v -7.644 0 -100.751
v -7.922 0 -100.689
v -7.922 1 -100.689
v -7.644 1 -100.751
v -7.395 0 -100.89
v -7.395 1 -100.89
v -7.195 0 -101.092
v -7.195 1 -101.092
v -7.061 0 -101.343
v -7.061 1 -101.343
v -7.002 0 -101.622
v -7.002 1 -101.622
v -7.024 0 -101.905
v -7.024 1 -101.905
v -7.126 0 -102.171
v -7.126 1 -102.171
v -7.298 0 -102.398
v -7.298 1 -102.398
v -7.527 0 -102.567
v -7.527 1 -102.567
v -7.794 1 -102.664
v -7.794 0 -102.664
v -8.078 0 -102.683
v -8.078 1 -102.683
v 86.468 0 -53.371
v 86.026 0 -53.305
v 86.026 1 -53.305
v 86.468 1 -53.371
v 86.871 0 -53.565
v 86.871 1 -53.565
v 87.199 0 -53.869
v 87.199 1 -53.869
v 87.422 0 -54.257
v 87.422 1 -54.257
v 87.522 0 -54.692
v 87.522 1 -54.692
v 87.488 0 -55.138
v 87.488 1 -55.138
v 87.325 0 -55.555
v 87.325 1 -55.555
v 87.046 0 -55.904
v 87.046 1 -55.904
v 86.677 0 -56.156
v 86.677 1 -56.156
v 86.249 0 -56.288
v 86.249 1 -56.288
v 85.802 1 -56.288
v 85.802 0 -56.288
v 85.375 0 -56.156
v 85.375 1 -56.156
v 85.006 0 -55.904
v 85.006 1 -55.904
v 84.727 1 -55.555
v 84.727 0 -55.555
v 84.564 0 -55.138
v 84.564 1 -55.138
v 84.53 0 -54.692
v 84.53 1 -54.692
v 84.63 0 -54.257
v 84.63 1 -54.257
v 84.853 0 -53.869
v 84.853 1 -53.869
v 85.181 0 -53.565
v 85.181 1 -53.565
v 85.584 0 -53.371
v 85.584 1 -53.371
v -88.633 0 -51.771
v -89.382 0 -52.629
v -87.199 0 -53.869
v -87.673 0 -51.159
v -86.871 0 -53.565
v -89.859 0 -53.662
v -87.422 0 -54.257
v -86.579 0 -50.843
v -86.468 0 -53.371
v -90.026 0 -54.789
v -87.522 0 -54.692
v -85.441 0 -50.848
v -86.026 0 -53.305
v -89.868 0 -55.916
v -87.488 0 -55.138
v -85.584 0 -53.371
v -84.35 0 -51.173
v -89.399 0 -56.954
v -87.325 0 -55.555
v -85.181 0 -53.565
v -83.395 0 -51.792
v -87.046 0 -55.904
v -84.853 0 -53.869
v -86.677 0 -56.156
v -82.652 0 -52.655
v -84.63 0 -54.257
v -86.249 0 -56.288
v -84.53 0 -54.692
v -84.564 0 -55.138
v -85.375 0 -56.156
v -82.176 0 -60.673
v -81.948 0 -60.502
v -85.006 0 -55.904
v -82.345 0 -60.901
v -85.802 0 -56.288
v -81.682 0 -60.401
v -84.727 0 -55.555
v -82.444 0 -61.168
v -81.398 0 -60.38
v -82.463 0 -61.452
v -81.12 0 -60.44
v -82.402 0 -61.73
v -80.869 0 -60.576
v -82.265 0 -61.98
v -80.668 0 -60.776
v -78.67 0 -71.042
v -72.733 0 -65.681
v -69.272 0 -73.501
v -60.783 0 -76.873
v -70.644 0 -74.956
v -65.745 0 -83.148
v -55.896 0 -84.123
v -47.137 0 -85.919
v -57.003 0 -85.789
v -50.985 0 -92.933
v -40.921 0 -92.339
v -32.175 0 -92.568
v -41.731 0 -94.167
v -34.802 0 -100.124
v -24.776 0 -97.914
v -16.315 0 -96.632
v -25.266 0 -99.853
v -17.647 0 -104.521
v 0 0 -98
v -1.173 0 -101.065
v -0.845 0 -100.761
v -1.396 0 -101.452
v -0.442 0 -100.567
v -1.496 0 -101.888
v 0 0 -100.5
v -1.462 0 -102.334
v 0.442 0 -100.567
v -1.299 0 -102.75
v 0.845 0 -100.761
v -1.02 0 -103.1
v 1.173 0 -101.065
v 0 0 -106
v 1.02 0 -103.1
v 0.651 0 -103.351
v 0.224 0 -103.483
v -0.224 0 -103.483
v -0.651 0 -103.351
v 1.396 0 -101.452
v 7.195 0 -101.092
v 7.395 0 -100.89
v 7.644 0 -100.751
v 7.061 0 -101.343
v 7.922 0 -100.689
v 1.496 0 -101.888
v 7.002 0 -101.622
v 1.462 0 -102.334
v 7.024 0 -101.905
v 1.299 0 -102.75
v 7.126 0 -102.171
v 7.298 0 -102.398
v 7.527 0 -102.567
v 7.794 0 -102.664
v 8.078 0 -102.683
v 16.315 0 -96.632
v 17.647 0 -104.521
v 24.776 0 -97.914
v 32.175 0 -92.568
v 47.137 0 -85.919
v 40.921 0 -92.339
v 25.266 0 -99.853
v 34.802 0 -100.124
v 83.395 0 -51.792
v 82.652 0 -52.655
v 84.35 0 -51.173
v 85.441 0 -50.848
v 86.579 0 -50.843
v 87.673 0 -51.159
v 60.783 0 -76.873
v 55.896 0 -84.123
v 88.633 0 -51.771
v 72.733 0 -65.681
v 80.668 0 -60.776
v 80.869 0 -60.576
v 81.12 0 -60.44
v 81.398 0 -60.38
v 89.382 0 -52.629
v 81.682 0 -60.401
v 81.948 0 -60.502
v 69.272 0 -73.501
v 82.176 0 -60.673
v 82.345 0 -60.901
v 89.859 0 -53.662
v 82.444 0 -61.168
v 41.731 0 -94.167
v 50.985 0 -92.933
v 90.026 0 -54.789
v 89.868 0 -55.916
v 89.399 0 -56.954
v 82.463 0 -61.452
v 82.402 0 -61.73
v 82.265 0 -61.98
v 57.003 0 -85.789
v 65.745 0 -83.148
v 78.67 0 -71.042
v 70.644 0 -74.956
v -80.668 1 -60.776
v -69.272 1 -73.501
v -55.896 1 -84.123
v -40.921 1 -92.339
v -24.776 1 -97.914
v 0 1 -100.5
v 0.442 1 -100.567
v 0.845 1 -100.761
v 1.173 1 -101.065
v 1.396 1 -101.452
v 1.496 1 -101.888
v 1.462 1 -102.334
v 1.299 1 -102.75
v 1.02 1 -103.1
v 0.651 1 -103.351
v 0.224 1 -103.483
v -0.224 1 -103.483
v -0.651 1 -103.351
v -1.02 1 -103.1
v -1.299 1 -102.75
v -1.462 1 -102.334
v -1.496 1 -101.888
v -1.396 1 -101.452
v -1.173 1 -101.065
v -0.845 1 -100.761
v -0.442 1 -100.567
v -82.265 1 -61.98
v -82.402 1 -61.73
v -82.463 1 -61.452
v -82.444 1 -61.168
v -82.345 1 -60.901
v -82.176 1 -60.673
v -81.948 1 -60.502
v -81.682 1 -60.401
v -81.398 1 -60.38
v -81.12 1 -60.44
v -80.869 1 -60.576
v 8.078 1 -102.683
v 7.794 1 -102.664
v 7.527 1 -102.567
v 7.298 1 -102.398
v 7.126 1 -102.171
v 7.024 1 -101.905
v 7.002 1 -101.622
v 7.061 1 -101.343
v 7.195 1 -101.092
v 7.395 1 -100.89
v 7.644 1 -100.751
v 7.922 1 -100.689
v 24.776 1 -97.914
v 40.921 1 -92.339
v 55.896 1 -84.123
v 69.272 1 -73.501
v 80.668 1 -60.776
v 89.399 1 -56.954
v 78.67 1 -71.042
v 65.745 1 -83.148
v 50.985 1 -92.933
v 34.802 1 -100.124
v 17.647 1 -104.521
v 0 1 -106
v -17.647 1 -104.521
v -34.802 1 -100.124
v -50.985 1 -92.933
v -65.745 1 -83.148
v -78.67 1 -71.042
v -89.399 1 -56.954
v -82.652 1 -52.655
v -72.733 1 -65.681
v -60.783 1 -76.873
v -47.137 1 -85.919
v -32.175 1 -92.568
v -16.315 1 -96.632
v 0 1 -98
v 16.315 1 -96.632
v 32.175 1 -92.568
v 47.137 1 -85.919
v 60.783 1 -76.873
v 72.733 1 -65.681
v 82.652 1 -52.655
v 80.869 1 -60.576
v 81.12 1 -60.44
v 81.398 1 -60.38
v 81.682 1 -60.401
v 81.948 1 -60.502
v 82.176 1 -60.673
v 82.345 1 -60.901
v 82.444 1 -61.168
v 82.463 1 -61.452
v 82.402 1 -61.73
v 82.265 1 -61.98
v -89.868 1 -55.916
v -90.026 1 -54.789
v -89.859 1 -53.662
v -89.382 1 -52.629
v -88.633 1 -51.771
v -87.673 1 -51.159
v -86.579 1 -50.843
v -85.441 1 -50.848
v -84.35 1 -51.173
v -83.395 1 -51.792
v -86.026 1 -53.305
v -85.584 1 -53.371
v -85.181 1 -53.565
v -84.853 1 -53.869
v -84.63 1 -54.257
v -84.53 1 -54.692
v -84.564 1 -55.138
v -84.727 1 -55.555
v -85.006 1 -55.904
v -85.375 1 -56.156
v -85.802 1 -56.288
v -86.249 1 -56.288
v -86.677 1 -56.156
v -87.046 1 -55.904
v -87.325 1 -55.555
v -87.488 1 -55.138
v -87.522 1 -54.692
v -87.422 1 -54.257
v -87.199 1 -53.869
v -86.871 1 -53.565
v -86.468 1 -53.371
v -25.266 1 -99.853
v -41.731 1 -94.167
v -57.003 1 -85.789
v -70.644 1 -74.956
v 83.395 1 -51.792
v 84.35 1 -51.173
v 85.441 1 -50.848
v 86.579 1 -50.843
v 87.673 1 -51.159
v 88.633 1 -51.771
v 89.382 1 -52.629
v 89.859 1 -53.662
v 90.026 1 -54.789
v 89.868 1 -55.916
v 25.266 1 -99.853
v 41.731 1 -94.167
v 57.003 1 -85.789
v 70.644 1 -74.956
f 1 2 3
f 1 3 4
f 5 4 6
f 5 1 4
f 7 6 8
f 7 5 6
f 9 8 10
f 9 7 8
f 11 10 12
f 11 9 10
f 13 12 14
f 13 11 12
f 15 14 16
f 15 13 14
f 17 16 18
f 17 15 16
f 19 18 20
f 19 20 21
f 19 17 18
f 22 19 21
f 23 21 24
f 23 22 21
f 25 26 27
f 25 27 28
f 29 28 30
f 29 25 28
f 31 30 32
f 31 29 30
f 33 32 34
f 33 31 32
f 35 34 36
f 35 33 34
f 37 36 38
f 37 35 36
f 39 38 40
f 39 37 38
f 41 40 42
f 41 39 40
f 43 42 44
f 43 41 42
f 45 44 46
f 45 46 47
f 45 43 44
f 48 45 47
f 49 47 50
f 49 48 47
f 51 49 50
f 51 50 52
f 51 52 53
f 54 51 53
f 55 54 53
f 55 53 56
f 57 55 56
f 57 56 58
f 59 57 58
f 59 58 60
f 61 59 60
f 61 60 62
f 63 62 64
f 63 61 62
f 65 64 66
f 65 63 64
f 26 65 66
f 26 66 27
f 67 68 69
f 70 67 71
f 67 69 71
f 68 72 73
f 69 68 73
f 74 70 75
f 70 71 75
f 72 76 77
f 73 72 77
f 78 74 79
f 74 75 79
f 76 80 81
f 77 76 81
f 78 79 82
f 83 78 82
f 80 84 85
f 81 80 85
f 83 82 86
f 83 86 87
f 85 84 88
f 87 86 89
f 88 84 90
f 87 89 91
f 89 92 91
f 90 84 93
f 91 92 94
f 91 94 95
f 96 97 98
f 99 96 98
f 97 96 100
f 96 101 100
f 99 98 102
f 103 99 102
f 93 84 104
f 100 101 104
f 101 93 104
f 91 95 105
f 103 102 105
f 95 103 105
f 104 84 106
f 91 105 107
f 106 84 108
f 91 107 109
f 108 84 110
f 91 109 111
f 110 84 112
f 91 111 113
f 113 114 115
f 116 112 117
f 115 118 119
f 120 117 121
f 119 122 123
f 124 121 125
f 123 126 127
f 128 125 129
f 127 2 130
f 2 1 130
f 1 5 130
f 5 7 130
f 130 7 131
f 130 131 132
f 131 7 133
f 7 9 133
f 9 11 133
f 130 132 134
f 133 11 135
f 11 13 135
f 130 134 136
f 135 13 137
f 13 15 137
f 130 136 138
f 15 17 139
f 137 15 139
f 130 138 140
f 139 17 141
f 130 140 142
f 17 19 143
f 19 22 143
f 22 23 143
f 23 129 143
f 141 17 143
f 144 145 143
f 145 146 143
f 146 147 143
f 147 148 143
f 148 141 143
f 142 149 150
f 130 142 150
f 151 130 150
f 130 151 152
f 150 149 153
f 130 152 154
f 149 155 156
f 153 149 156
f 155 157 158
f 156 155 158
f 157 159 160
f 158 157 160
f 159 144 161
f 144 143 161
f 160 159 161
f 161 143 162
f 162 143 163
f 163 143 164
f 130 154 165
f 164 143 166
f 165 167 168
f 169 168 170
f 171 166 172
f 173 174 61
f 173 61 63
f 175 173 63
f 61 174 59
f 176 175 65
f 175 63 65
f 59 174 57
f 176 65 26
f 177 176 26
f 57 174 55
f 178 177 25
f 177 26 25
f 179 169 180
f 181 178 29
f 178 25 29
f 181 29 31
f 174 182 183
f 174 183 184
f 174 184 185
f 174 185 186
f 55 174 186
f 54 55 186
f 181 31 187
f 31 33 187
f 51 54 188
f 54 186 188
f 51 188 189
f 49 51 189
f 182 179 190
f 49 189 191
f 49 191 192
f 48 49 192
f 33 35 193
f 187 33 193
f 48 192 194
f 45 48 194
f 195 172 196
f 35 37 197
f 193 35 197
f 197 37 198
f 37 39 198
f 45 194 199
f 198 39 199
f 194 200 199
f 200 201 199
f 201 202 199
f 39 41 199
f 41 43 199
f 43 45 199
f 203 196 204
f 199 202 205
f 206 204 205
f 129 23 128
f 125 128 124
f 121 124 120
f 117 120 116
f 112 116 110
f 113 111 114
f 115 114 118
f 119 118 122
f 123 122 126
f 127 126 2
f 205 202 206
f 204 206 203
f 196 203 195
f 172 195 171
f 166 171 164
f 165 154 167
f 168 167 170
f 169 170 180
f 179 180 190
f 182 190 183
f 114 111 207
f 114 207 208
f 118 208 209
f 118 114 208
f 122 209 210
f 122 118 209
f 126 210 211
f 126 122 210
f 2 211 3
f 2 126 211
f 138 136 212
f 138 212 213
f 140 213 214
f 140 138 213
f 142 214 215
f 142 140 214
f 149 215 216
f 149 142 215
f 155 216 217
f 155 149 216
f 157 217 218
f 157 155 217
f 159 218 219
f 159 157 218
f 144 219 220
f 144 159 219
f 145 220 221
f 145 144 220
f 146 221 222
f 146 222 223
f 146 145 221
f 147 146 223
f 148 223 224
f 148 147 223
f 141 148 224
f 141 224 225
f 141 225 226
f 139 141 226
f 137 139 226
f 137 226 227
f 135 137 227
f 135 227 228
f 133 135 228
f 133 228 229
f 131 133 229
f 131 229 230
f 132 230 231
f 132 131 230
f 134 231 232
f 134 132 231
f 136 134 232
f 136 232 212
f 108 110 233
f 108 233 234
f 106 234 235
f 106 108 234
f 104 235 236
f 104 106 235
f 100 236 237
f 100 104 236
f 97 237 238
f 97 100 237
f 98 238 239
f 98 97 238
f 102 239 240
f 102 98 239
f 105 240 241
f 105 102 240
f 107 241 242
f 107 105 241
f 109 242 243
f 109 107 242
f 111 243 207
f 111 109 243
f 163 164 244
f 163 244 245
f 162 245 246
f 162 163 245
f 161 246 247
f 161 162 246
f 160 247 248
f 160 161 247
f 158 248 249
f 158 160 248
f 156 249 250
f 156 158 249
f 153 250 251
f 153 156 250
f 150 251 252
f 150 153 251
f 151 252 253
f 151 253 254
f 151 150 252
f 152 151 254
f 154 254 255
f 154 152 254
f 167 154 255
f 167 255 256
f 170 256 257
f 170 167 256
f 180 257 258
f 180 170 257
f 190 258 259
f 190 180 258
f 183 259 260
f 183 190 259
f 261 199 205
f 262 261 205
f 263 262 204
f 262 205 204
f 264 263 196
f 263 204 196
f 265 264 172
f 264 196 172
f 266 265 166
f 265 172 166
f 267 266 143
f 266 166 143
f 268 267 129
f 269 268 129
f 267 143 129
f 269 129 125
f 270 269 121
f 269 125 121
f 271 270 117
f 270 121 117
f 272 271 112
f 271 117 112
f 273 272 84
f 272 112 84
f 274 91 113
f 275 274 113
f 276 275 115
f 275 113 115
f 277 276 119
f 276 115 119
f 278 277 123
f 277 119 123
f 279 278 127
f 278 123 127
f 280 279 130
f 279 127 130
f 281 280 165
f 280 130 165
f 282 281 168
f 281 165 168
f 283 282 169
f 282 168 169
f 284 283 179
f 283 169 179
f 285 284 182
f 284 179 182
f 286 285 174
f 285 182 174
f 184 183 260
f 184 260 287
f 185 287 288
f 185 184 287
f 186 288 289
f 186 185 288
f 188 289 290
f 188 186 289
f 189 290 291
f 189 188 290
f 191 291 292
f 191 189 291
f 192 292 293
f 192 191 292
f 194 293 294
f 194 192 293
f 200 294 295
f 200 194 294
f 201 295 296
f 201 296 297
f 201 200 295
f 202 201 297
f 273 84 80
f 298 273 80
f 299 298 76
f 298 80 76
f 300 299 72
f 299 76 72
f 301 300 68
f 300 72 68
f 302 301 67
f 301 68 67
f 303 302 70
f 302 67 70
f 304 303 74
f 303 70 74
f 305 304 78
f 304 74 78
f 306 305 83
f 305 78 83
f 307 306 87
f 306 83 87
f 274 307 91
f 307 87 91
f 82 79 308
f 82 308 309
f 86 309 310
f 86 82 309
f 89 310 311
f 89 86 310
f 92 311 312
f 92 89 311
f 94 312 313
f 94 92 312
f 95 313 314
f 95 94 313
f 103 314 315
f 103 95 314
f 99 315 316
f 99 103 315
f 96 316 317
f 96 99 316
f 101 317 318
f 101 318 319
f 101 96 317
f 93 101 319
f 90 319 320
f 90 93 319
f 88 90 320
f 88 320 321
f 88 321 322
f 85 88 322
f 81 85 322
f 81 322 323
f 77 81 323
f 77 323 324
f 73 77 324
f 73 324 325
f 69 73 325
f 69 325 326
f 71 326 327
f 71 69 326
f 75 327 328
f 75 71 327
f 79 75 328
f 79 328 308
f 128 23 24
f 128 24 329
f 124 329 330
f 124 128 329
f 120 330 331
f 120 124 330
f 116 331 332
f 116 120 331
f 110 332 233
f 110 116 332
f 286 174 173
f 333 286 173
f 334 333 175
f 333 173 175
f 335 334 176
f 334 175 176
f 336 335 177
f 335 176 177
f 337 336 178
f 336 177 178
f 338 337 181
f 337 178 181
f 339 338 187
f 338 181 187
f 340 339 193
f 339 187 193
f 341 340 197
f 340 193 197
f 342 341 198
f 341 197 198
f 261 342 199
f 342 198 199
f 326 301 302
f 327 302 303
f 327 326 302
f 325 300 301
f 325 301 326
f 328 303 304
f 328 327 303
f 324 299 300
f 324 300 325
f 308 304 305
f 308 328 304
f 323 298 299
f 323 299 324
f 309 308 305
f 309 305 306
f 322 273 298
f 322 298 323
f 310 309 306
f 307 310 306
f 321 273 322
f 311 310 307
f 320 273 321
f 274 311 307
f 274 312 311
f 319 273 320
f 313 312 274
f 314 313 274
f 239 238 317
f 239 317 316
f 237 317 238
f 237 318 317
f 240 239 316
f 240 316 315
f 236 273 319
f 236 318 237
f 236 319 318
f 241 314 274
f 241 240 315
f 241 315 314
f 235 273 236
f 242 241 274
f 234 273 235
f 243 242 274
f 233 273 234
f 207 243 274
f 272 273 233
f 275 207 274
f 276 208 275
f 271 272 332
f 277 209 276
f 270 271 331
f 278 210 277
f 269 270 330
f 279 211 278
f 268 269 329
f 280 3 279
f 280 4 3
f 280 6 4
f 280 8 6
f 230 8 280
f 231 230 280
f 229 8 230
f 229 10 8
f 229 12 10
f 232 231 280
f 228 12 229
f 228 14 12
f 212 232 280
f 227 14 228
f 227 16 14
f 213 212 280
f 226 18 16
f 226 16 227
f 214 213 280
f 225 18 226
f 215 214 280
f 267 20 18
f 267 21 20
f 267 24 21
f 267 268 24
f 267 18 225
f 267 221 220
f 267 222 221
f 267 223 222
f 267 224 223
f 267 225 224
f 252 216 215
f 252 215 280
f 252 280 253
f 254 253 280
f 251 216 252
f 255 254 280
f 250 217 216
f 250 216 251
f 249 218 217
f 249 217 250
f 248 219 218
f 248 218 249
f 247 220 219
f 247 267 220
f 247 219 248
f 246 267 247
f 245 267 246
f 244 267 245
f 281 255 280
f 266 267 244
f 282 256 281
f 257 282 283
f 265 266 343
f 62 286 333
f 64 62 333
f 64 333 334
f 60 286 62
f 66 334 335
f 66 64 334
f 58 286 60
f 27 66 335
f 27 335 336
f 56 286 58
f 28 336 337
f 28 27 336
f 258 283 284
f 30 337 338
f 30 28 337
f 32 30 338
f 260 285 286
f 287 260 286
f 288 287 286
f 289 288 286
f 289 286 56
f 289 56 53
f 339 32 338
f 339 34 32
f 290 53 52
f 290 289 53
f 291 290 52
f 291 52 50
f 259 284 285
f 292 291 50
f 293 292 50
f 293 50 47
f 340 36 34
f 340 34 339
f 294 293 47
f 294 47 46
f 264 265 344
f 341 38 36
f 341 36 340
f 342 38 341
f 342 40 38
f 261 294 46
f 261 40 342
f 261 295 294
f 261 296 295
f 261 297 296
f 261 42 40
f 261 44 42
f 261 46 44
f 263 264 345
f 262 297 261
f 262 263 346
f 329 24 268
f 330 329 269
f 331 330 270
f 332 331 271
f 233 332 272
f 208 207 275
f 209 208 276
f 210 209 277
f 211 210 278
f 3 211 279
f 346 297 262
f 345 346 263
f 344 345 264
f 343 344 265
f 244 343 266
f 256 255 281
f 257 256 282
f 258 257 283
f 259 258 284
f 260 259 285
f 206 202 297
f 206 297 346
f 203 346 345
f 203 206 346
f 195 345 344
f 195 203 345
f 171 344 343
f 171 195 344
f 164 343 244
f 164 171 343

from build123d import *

# Parameters (mm, degrees)
SKETCH_1_R      = 1.5
EXTRUDE_1_DEPTH = 1


with BuildPart() as part:
    # 草图1 → 凸台-拉伸1 (new body)
    with BuildSketch(Plane(origin=(0, 0, 0), x_dir=(1, 0, 0), z_dir=(0, 1, 0))):
        with BuildLine():
            ThreePointArc((89.399493256, 56.953758485), (0, 106), (-89.399493256, 56.953758485))
            ThreePointArc((-89.399493256, 56.953758485), (-88.175125906, 51.430994268), (-82.65236169, 52.655361618))
            ThreePointArc((-82.65236169, 52.655361618), (0, 98), (82.65236169, 52.655361618))
            ThreePointArc((82.65236169, 52.655361618), (88.175125906, 51.430994268), (89.399493256, 56.953758485))
        make_face()
        with Locations(Location((0, 102, 0), (0, 0, 270))):
            Circle(SKETCH_1_R, mode=Mode.SUBTRACT)
        with Locations(Location((-86.025927473, 54.804560051, 0), (0, 0, 270))):
            Circle(SKETCH_1_R, mode=Mode.SUBTRACT)
        with Locations(Location((86.025927473, 54.804560051, 0), (0, 0, 270))):
            Circle(SKETCH_1_R, mode=Mode.SUBTRACT)
        with BuildLine():
            ThreePointArc((-8.078431373, 102.682710066), (-49.544575655, 90.301356707), (-82.264932334, 61.979681413))
            ThreePointArc((-82.264932334, 61.979681413), (-82.067988151, 60.579248269), (-80.667555008, 60.776192453))
            ThreePointArc((-80.667555008, 60.776192453), (-48.58254506, 88.547932305), (-7.921568627, 100.688871036))
            ThreePointArc((-7.921568627, 100.688871036), (-7.003080485, 101.764221924), (-8.078431373, 102.682710066))
        make_face(mode=Mode.SUBTRACT)
        with BuildLine():
            ThreePointArc((82.264932334, 61.979681413), (49.544575655, 90.301356707), (8.078431373, 102.682710066))
            ThreePointArc((8.078431373, 102.682710066), (7.003080485, 101.764221924), (7.921568627, 100.688871036))
            ThreePointArc((7.921568627, 100.688871036), (48.58254506, 88.547932305), (80.667555008, 60.776192453))
            ThreePointArc((80.667555008, 60.776192453), (82.067988151, 60.579248269), (82.264932334, 61.979681413))
        make_face(mode=Mode.SUBTRACT)
    extrude(amount=EXTRUDE_1_DEPTH)


solid = part.part
